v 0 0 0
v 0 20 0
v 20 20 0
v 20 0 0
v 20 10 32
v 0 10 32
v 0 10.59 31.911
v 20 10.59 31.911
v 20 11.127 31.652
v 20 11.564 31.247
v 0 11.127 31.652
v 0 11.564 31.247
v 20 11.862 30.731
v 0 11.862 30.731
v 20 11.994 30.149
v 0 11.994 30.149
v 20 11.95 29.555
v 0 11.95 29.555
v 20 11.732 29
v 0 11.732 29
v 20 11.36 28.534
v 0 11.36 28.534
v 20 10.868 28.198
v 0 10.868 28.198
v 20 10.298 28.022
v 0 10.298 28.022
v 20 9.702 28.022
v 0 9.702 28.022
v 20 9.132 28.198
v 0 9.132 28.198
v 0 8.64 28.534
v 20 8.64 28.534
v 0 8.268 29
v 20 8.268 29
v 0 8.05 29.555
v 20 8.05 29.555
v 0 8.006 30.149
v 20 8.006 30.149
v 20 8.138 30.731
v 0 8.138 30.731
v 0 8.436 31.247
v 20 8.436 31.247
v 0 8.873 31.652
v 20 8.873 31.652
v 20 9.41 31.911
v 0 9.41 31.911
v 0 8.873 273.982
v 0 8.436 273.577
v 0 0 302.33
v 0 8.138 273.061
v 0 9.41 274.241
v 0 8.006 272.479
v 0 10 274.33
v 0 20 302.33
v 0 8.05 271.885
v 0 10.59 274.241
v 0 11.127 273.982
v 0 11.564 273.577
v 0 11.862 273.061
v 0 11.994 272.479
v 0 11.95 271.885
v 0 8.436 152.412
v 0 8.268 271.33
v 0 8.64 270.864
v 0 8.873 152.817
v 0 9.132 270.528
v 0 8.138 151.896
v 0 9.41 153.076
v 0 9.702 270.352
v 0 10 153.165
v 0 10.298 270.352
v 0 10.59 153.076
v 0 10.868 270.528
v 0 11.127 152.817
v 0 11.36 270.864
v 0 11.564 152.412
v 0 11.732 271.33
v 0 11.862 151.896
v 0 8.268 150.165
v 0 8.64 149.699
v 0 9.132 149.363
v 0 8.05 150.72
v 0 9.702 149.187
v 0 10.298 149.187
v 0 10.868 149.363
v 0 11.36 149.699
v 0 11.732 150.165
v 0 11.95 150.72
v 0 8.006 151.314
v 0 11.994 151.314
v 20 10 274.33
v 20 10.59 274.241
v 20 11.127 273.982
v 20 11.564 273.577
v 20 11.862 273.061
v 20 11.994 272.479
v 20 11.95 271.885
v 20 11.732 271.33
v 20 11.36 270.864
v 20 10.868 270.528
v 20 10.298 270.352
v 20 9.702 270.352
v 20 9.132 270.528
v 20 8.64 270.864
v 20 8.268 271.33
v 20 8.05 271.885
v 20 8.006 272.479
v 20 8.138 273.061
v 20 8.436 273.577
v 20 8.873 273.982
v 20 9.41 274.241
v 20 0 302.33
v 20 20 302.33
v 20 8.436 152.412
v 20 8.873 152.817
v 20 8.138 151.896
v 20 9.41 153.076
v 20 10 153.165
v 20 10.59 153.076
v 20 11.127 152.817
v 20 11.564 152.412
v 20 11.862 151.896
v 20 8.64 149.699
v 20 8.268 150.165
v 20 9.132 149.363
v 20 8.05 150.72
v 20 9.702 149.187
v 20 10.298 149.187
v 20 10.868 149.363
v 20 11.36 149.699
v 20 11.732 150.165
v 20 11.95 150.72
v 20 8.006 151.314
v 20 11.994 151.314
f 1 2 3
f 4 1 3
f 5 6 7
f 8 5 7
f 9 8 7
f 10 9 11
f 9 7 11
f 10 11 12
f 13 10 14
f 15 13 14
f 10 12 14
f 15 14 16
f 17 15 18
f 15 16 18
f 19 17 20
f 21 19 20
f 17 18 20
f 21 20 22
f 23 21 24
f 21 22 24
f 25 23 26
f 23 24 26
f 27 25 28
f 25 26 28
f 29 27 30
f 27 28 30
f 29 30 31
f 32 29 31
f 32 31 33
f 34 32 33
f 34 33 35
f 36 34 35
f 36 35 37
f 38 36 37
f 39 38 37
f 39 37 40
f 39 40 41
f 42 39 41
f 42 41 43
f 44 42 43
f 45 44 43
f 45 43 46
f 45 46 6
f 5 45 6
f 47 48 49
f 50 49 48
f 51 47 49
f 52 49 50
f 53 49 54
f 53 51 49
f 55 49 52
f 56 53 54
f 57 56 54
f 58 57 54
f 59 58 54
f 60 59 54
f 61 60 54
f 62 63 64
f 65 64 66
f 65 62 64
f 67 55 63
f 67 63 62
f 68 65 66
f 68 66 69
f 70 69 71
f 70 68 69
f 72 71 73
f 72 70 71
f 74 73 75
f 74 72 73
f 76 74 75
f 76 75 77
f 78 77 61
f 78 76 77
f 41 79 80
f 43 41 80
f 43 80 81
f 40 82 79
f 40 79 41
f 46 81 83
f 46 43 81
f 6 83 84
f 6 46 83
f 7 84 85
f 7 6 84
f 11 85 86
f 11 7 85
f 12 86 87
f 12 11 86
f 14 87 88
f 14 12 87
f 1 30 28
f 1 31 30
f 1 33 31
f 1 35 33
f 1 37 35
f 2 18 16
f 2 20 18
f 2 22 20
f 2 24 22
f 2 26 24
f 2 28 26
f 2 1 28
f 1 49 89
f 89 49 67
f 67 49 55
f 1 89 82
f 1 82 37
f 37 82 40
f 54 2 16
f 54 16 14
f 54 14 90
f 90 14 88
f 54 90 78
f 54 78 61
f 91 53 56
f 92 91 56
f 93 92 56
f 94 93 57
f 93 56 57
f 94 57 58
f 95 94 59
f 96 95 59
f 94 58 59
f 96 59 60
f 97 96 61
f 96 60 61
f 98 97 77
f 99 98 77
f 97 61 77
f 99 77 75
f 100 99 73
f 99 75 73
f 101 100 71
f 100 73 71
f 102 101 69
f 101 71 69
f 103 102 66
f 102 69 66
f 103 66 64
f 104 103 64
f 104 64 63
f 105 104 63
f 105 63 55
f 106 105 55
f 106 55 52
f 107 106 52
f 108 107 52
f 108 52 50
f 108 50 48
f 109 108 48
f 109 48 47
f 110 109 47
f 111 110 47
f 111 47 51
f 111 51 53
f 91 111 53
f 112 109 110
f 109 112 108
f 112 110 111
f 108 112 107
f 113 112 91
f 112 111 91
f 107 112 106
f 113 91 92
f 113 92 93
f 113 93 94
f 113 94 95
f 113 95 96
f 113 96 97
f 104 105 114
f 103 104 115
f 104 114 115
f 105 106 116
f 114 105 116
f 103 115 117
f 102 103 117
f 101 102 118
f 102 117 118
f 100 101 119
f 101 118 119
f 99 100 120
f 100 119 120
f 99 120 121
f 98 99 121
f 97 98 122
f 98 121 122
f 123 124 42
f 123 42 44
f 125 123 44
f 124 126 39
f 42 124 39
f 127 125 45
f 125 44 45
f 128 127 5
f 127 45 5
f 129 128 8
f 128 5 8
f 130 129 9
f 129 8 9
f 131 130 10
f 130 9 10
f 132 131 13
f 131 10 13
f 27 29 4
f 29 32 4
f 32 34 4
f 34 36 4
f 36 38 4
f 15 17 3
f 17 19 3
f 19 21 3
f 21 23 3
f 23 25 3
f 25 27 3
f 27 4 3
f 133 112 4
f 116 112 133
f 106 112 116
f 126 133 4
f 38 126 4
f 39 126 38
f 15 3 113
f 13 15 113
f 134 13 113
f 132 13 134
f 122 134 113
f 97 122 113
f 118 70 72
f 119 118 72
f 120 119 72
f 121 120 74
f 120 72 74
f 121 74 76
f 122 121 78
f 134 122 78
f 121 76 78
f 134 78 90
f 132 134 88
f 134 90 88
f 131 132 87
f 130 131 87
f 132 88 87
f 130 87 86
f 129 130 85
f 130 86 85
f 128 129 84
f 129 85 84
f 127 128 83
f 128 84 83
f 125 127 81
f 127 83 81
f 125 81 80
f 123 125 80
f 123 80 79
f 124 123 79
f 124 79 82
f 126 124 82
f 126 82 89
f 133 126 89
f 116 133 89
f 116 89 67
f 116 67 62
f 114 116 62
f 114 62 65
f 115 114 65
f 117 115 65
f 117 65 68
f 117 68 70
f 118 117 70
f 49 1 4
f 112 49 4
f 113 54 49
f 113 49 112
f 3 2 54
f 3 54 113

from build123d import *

# Parameters (mm, degrees)
SKETCH1_W           = 20
SKETCH1_H           = 20
BOSS_EXTRUDE1_DEPTH = 302.33
SKETCH2_R           = 2
CUT_EXTRUDE1_DEPTH  = 21


with BuildPart() as part:
    # Sketch1 → Boss-Extrude1 (new body)
    with BuildSketch(Plane.XY):
        with Locations((10, 10)):
            Rectangle(SKETCH1_W, SKETCH1_H)
    extrude(amount=BOSS_EXTRUDE1_DEPTH)

    # Sketch2 → Cut-Extrude1 (cut, through all)
    with BuildSketch(Plane.ZY):
        with Locations((30, 10)):
            Circle(SKETCH2_R)
        with Locations((272.33, 10)):
            Circle(SKETCH2_R)
        with Locations((151.165, 10)):
            Circle(SKETCH2_R)
    extrude(amount=-CUT_EXTRUDE1_DEPTH, mode=Mode.SUBTRACT)


solid = part.part
